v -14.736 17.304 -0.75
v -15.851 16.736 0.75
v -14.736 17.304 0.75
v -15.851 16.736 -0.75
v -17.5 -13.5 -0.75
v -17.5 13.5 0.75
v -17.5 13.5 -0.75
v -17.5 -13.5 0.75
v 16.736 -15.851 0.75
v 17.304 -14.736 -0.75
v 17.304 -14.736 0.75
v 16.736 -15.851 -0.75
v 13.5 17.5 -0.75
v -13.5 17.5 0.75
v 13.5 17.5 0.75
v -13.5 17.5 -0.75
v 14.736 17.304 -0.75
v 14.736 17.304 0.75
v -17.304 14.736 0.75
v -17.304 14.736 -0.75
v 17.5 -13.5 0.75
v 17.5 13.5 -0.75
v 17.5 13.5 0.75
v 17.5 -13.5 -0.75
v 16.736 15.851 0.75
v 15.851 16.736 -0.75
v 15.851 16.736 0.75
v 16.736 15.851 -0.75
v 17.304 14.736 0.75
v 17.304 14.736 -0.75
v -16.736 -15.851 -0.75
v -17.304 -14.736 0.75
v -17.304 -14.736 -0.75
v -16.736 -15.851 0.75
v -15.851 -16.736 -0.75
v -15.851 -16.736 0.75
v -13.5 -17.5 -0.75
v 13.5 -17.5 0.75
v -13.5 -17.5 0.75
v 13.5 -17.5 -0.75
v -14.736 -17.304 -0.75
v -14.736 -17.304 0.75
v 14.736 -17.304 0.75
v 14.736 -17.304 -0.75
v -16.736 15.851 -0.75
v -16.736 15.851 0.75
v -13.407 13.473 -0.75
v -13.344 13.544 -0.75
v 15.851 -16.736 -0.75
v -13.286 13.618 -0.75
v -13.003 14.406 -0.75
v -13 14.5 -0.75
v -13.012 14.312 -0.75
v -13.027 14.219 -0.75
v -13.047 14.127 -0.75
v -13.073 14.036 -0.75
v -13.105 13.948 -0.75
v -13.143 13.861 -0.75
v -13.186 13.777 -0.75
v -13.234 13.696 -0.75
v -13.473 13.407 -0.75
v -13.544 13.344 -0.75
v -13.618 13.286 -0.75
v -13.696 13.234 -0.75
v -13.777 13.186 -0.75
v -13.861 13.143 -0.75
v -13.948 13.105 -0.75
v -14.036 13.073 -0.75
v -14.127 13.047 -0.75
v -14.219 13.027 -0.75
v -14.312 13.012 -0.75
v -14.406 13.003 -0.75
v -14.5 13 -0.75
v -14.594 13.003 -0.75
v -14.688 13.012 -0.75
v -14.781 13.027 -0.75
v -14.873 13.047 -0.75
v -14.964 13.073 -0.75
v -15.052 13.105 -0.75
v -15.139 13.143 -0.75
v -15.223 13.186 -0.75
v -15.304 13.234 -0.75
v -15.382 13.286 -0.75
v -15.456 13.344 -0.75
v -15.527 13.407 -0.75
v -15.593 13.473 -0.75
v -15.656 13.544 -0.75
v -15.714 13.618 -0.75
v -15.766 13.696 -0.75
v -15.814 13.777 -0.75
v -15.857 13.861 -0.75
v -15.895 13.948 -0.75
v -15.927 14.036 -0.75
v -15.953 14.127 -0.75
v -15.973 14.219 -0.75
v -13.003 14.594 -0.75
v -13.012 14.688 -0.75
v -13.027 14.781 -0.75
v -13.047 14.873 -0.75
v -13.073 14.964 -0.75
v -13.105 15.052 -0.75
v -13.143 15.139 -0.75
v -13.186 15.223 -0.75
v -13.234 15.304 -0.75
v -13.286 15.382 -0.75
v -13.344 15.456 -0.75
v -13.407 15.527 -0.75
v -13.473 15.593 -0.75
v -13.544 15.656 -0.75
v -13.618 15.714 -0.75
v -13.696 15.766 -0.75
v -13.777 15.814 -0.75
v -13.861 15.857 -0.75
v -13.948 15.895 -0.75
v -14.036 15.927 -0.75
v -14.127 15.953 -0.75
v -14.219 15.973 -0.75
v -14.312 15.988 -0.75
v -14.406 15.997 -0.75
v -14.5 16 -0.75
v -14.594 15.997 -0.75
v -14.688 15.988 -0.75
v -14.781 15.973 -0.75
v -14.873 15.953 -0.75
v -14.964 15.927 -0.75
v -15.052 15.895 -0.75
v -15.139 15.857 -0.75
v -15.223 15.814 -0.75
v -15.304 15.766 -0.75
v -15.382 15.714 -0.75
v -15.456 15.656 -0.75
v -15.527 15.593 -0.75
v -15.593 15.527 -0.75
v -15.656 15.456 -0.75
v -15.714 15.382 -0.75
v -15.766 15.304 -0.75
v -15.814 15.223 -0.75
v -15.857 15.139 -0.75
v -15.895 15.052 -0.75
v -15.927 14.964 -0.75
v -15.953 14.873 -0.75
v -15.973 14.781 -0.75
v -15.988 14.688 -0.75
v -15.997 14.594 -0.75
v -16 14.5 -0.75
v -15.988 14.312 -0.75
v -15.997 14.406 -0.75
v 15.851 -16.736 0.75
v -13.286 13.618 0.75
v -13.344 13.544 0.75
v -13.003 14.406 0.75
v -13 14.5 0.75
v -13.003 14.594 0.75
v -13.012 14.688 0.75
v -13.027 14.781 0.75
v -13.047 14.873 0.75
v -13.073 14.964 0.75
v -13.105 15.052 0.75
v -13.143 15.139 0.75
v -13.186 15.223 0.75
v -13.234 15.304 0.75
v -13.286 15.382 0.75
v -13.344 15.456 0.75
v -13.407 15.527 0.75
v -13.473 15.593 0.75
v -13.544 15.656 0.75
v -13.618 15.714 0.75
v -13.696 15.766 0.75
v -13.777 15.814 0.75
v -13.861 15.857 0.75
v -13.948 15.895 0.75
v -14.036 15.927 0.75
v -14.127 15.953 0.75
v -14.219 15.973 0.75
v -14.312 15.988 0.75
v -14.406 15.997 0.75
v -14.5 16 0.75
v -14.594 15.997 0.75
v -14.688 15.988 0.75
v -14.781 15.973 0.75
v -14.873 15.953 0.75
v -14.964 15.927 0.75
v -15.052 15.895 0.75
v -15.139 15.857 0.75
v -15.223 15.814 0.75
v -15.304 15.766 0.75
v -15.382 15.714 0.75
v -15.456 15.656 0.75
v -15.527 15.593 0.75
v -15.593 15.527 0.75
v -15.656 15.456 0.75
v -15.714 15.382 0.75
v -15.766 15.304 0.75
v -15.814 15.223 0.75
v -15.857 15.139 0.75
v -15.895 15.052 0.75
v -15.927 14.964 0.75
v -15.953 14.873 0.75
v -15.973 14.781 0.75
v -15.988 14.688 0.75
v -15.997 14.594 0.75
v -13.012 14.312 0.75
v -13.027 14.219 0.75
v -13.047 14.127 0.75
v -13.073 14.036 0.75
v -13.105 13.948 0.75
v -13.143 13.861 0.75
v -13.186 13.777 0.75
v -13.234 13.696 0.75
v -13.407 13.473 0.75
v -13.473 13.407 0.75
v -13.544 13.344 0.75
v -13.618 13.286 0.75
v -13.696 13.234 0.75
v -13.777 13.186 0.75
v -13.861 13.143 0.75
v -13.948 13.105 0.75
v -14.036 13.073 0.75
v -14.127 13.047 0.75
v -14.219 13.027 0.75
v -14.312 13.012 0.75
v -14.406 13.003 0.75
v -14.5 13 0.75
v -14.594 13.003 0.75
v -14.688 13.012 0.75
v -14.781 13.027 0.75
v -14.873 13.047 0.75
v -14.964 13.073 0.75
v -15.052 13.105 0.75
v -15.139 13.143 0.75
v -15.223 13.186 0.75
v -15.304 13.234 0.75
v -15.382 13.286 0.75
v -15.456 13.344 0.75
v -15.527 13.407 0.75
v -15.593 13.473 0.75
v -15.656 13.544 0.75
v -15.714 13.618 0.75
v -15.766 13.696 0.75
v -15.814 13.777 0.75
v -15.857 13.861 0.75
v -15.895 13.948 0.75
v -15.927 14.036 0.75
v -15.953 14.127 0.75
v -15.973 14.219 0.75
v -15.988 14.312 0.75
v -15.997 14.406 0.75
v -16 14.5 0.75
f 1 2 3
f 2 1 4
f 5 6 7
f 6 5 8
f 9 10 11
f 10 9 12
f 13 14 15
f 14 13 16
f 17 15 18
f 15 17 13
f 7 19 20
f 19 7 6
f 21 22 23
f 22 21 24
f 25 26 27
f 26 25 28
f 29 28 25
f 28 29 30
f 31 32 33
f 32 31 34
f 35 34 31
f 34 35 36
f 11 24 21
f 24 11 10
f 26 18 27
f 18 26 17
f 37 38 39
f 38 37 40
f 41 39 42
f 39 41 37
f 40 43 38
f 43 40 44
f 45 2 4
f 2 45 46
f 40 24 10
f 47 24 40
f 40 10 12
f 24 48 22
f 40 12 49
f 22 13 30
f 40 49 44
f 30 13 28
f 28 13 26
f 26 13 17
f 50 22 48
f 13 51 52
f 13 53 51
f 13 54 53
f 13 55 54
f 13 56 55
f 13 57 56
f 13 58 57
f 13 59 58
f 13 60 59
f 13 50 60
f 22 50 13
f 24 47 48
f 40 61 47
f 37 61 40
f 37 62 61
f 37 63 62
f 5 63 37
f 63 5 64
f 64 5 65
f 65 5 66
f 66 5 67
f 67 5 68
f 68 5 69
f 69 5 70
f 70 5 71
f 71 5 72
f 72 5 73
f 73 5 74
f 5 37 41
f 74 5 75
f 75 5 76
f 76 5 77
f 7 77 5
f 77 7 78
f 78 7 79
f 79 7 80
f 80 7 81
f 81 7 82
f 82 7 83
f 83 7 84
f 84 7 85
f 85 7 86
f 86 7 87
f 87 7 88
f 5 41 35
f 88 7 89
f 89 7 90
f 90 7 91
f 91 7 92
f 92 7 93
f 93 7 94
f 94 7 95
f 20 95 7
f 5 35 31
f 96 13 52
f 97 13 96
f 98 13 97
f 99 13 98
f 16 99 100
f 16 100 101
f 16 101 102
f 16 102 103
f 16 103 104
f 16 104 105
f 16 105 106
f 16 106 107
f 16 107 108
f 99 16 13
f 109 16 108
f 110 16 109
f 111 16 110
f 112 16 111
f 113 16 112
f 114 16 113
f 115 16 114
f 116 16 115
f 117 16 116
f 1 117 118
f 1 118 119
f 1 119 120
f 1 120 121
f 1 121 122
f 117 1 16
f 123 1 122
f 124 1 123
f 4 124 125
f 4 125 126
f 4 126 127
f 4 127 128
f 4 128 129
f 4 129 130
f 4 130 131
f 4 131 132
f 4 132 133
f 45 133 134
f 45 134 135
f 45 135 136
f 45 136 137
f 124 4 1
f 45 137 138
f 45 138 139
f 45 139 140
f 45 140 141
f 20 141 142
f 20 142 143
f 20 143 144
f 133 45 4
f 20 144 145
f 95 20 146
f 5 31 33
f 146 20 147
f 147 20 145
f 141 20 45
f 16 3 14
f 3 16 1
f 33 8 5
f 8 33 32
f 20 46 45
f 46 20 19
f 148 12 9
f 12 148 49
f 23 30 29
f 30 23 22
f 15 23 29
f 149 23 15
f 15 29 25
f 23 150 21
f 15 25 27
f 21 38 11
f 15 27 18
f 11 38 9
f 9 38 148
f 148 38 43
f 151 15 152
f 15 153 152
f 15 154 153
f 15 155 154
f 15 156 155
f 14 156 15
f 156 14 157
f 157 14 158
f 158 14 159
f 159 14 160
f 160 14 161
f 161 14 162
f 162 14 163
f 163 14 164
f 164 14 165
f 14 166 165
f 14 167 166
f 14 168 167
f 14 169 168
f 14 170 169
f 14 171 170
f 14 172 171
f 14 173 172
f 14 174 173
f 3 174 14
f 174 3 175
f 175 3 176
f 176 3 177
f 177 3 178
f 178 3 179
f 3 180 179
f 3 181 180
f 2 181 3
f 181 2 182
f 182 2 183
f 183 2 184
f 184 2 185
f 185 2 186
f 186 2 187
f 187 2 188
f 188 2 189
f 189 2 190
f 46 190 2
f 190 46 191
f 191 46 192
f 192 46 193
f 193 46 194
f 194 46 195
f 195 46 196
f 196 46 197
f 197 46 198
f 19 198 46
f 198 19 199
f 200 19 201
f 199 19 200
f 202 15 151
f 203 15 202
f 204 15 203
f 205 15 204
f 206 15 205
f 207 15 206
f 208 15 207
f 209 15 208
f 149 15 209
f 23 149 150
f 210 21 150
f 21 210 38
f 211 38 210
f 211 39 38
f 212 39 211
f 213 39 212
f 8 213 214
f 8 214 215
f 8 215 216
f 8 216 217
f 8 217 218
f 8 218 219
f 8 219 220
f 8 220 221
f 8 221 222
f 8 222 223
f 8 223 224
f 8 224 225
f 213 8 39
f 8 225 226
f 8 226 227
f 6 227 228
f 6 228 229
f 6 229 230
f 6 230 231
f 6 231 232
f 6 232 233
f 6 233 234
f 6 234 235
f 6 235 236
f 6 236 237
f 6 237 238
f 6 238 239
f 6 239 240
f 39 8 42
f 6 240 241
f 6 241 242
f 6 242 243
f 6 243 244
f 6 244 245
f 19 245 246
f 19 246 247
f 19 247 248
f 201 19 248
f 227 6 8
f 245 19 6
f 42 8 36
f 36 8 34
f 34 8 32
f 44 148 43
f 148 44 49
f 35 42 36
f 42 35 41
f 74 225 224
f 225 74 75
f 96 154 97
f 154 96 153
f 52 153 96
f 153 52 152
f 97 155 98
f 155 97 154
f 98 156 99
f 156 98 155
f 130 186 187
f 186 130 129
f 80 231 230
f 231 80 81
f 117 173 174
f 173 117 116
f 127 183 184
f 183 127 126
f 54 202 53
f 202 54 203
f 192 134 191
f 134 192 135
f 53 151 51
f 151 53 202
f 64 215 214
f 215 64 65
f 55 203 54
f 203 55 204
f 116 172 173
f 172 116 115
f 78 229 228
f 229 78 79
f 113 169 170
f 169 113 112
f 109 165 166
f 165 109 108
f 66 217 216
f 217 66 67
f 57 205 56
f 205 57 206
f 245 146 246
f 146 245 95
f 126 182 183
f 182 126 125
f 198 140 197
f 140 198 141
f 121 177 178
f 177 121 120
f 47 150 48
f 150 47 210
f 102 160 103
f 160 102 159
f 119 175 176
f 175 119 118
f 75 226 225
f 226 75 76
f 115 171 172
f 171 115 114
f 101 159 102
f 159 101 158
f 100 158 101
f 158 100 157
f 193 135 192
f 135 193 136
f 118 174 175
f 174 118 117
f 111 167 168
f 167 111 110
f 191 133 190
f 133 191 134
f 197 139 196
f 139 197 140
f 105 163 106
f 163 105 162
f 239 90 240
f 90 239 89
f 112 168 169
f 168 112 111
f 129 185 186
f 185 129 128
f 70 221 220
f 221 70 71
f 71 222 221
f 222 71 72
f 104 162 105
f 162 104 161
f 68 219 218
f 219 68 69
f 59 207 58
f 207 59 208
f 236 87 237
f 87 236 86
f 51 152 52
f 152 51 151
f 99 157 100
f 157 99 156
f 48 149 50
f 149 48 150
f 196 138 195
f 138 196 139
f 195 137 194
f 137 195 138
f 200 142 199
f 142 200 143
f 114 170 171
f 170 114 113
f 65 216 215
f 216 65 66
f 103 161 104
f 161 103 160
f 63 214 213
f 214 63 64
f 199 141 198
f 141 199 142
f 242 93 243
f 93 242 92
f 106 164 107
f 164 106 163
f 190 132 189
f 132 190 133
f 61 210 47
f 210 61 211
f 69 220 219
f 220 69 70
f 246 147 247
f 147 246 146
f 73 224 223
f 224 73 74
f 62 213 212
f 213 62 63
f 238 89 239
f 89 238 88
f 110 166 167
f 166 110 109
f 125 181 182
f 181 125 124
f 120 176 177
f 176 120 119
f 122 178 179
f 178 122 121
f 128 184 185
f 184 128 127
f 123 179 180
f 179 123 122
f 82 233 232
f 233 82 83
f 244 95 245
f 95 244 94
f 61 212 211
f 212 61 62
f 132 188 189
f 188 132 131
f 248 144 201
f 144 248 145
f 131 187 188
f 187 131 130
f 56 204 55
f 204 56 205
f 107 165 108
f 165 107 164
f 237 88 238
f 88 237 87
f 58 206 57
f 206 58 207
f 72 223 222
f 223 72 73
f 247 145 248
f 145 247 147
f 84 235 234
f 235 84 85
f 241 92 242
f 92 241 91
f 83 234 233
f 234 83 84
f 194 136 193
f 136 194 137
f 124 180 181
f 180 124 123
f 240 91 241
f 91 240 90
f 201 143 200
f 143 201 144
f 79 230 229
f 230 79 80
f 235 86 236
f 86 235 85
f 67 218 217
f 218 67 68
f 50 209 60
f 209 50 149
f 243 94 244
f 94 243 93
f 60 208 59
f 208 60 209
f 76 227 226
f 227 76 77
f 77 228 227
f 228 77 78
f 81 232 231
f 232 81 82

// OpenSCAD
//Gumcam(15,3);


module Gumcam(radius,depth)
{
	scale([radius/28,radius/28,1])
	//rotate(a = [0,90,0])
	linear_extrude(height = depth)
	import("GUMCAMv3.dxf");
}

//-- Cilindro normal. r es el radio, h es la altura
module redondo(){
rad = 20;
difference() {

	cylinder (r = rad, h = 3, $fn = 100);
	translate([0,rad -4, -10])
	cylinder (r = 1.5, h = 20, $fn = 100);
}
}
module cuad_red(lx,ly,r,h){
//-- Parametros de la caja
/*lx = 40; //-- Longitud en eje x
ly = 40; //-- Longitud en eje y
r = 5; //-- Radio del redondeo de las esquinas
h = 3; //-- Altura*/
h=h/2;
//-- Coordenadas del cilindro del primer cuadrante
cx = lx/2 - r;
cy = ly/2 - r;

//-- Posicion de los 4 cilindros de las esquinas
P1 = [cx, cy, 0];
P2 = [-cx, cy, 0];
P3 = [-cx, -cy, 0];
P4 = [cx, -cy, 0];
 

//-- Obtener el menor objeto convexo que contiene
//-- los 4 cilindros
hull() {
  translate(P1)
    cylinder(r = r, h = h, center = true, $fn = 20);
   
  translate(P2)
    cylinder(r = r, h = h, center = true, $fn = 20);
   
  translate(P3)
    cylinder(r = r, h = h, center = true, $fn = 20);
   
  translate(P4)
    cylinder(r = r, h = h, center = true, $fn = 20);
}


}
module base(dim,h){
difference() {
cuad_red(dim,dim,4,h);
	translate([-dim/2+3,dim/2-3, -10])
	cylinder (r = 1.5, h = 20, $fn = 100);
}
}


module llavero(dim,h){
union(){
	color ("red")base(dim,h);
	translate([-8,-5, h/4])
	Gumcam(dim/3,h/3*2);
}

}

llavero(35,3);
